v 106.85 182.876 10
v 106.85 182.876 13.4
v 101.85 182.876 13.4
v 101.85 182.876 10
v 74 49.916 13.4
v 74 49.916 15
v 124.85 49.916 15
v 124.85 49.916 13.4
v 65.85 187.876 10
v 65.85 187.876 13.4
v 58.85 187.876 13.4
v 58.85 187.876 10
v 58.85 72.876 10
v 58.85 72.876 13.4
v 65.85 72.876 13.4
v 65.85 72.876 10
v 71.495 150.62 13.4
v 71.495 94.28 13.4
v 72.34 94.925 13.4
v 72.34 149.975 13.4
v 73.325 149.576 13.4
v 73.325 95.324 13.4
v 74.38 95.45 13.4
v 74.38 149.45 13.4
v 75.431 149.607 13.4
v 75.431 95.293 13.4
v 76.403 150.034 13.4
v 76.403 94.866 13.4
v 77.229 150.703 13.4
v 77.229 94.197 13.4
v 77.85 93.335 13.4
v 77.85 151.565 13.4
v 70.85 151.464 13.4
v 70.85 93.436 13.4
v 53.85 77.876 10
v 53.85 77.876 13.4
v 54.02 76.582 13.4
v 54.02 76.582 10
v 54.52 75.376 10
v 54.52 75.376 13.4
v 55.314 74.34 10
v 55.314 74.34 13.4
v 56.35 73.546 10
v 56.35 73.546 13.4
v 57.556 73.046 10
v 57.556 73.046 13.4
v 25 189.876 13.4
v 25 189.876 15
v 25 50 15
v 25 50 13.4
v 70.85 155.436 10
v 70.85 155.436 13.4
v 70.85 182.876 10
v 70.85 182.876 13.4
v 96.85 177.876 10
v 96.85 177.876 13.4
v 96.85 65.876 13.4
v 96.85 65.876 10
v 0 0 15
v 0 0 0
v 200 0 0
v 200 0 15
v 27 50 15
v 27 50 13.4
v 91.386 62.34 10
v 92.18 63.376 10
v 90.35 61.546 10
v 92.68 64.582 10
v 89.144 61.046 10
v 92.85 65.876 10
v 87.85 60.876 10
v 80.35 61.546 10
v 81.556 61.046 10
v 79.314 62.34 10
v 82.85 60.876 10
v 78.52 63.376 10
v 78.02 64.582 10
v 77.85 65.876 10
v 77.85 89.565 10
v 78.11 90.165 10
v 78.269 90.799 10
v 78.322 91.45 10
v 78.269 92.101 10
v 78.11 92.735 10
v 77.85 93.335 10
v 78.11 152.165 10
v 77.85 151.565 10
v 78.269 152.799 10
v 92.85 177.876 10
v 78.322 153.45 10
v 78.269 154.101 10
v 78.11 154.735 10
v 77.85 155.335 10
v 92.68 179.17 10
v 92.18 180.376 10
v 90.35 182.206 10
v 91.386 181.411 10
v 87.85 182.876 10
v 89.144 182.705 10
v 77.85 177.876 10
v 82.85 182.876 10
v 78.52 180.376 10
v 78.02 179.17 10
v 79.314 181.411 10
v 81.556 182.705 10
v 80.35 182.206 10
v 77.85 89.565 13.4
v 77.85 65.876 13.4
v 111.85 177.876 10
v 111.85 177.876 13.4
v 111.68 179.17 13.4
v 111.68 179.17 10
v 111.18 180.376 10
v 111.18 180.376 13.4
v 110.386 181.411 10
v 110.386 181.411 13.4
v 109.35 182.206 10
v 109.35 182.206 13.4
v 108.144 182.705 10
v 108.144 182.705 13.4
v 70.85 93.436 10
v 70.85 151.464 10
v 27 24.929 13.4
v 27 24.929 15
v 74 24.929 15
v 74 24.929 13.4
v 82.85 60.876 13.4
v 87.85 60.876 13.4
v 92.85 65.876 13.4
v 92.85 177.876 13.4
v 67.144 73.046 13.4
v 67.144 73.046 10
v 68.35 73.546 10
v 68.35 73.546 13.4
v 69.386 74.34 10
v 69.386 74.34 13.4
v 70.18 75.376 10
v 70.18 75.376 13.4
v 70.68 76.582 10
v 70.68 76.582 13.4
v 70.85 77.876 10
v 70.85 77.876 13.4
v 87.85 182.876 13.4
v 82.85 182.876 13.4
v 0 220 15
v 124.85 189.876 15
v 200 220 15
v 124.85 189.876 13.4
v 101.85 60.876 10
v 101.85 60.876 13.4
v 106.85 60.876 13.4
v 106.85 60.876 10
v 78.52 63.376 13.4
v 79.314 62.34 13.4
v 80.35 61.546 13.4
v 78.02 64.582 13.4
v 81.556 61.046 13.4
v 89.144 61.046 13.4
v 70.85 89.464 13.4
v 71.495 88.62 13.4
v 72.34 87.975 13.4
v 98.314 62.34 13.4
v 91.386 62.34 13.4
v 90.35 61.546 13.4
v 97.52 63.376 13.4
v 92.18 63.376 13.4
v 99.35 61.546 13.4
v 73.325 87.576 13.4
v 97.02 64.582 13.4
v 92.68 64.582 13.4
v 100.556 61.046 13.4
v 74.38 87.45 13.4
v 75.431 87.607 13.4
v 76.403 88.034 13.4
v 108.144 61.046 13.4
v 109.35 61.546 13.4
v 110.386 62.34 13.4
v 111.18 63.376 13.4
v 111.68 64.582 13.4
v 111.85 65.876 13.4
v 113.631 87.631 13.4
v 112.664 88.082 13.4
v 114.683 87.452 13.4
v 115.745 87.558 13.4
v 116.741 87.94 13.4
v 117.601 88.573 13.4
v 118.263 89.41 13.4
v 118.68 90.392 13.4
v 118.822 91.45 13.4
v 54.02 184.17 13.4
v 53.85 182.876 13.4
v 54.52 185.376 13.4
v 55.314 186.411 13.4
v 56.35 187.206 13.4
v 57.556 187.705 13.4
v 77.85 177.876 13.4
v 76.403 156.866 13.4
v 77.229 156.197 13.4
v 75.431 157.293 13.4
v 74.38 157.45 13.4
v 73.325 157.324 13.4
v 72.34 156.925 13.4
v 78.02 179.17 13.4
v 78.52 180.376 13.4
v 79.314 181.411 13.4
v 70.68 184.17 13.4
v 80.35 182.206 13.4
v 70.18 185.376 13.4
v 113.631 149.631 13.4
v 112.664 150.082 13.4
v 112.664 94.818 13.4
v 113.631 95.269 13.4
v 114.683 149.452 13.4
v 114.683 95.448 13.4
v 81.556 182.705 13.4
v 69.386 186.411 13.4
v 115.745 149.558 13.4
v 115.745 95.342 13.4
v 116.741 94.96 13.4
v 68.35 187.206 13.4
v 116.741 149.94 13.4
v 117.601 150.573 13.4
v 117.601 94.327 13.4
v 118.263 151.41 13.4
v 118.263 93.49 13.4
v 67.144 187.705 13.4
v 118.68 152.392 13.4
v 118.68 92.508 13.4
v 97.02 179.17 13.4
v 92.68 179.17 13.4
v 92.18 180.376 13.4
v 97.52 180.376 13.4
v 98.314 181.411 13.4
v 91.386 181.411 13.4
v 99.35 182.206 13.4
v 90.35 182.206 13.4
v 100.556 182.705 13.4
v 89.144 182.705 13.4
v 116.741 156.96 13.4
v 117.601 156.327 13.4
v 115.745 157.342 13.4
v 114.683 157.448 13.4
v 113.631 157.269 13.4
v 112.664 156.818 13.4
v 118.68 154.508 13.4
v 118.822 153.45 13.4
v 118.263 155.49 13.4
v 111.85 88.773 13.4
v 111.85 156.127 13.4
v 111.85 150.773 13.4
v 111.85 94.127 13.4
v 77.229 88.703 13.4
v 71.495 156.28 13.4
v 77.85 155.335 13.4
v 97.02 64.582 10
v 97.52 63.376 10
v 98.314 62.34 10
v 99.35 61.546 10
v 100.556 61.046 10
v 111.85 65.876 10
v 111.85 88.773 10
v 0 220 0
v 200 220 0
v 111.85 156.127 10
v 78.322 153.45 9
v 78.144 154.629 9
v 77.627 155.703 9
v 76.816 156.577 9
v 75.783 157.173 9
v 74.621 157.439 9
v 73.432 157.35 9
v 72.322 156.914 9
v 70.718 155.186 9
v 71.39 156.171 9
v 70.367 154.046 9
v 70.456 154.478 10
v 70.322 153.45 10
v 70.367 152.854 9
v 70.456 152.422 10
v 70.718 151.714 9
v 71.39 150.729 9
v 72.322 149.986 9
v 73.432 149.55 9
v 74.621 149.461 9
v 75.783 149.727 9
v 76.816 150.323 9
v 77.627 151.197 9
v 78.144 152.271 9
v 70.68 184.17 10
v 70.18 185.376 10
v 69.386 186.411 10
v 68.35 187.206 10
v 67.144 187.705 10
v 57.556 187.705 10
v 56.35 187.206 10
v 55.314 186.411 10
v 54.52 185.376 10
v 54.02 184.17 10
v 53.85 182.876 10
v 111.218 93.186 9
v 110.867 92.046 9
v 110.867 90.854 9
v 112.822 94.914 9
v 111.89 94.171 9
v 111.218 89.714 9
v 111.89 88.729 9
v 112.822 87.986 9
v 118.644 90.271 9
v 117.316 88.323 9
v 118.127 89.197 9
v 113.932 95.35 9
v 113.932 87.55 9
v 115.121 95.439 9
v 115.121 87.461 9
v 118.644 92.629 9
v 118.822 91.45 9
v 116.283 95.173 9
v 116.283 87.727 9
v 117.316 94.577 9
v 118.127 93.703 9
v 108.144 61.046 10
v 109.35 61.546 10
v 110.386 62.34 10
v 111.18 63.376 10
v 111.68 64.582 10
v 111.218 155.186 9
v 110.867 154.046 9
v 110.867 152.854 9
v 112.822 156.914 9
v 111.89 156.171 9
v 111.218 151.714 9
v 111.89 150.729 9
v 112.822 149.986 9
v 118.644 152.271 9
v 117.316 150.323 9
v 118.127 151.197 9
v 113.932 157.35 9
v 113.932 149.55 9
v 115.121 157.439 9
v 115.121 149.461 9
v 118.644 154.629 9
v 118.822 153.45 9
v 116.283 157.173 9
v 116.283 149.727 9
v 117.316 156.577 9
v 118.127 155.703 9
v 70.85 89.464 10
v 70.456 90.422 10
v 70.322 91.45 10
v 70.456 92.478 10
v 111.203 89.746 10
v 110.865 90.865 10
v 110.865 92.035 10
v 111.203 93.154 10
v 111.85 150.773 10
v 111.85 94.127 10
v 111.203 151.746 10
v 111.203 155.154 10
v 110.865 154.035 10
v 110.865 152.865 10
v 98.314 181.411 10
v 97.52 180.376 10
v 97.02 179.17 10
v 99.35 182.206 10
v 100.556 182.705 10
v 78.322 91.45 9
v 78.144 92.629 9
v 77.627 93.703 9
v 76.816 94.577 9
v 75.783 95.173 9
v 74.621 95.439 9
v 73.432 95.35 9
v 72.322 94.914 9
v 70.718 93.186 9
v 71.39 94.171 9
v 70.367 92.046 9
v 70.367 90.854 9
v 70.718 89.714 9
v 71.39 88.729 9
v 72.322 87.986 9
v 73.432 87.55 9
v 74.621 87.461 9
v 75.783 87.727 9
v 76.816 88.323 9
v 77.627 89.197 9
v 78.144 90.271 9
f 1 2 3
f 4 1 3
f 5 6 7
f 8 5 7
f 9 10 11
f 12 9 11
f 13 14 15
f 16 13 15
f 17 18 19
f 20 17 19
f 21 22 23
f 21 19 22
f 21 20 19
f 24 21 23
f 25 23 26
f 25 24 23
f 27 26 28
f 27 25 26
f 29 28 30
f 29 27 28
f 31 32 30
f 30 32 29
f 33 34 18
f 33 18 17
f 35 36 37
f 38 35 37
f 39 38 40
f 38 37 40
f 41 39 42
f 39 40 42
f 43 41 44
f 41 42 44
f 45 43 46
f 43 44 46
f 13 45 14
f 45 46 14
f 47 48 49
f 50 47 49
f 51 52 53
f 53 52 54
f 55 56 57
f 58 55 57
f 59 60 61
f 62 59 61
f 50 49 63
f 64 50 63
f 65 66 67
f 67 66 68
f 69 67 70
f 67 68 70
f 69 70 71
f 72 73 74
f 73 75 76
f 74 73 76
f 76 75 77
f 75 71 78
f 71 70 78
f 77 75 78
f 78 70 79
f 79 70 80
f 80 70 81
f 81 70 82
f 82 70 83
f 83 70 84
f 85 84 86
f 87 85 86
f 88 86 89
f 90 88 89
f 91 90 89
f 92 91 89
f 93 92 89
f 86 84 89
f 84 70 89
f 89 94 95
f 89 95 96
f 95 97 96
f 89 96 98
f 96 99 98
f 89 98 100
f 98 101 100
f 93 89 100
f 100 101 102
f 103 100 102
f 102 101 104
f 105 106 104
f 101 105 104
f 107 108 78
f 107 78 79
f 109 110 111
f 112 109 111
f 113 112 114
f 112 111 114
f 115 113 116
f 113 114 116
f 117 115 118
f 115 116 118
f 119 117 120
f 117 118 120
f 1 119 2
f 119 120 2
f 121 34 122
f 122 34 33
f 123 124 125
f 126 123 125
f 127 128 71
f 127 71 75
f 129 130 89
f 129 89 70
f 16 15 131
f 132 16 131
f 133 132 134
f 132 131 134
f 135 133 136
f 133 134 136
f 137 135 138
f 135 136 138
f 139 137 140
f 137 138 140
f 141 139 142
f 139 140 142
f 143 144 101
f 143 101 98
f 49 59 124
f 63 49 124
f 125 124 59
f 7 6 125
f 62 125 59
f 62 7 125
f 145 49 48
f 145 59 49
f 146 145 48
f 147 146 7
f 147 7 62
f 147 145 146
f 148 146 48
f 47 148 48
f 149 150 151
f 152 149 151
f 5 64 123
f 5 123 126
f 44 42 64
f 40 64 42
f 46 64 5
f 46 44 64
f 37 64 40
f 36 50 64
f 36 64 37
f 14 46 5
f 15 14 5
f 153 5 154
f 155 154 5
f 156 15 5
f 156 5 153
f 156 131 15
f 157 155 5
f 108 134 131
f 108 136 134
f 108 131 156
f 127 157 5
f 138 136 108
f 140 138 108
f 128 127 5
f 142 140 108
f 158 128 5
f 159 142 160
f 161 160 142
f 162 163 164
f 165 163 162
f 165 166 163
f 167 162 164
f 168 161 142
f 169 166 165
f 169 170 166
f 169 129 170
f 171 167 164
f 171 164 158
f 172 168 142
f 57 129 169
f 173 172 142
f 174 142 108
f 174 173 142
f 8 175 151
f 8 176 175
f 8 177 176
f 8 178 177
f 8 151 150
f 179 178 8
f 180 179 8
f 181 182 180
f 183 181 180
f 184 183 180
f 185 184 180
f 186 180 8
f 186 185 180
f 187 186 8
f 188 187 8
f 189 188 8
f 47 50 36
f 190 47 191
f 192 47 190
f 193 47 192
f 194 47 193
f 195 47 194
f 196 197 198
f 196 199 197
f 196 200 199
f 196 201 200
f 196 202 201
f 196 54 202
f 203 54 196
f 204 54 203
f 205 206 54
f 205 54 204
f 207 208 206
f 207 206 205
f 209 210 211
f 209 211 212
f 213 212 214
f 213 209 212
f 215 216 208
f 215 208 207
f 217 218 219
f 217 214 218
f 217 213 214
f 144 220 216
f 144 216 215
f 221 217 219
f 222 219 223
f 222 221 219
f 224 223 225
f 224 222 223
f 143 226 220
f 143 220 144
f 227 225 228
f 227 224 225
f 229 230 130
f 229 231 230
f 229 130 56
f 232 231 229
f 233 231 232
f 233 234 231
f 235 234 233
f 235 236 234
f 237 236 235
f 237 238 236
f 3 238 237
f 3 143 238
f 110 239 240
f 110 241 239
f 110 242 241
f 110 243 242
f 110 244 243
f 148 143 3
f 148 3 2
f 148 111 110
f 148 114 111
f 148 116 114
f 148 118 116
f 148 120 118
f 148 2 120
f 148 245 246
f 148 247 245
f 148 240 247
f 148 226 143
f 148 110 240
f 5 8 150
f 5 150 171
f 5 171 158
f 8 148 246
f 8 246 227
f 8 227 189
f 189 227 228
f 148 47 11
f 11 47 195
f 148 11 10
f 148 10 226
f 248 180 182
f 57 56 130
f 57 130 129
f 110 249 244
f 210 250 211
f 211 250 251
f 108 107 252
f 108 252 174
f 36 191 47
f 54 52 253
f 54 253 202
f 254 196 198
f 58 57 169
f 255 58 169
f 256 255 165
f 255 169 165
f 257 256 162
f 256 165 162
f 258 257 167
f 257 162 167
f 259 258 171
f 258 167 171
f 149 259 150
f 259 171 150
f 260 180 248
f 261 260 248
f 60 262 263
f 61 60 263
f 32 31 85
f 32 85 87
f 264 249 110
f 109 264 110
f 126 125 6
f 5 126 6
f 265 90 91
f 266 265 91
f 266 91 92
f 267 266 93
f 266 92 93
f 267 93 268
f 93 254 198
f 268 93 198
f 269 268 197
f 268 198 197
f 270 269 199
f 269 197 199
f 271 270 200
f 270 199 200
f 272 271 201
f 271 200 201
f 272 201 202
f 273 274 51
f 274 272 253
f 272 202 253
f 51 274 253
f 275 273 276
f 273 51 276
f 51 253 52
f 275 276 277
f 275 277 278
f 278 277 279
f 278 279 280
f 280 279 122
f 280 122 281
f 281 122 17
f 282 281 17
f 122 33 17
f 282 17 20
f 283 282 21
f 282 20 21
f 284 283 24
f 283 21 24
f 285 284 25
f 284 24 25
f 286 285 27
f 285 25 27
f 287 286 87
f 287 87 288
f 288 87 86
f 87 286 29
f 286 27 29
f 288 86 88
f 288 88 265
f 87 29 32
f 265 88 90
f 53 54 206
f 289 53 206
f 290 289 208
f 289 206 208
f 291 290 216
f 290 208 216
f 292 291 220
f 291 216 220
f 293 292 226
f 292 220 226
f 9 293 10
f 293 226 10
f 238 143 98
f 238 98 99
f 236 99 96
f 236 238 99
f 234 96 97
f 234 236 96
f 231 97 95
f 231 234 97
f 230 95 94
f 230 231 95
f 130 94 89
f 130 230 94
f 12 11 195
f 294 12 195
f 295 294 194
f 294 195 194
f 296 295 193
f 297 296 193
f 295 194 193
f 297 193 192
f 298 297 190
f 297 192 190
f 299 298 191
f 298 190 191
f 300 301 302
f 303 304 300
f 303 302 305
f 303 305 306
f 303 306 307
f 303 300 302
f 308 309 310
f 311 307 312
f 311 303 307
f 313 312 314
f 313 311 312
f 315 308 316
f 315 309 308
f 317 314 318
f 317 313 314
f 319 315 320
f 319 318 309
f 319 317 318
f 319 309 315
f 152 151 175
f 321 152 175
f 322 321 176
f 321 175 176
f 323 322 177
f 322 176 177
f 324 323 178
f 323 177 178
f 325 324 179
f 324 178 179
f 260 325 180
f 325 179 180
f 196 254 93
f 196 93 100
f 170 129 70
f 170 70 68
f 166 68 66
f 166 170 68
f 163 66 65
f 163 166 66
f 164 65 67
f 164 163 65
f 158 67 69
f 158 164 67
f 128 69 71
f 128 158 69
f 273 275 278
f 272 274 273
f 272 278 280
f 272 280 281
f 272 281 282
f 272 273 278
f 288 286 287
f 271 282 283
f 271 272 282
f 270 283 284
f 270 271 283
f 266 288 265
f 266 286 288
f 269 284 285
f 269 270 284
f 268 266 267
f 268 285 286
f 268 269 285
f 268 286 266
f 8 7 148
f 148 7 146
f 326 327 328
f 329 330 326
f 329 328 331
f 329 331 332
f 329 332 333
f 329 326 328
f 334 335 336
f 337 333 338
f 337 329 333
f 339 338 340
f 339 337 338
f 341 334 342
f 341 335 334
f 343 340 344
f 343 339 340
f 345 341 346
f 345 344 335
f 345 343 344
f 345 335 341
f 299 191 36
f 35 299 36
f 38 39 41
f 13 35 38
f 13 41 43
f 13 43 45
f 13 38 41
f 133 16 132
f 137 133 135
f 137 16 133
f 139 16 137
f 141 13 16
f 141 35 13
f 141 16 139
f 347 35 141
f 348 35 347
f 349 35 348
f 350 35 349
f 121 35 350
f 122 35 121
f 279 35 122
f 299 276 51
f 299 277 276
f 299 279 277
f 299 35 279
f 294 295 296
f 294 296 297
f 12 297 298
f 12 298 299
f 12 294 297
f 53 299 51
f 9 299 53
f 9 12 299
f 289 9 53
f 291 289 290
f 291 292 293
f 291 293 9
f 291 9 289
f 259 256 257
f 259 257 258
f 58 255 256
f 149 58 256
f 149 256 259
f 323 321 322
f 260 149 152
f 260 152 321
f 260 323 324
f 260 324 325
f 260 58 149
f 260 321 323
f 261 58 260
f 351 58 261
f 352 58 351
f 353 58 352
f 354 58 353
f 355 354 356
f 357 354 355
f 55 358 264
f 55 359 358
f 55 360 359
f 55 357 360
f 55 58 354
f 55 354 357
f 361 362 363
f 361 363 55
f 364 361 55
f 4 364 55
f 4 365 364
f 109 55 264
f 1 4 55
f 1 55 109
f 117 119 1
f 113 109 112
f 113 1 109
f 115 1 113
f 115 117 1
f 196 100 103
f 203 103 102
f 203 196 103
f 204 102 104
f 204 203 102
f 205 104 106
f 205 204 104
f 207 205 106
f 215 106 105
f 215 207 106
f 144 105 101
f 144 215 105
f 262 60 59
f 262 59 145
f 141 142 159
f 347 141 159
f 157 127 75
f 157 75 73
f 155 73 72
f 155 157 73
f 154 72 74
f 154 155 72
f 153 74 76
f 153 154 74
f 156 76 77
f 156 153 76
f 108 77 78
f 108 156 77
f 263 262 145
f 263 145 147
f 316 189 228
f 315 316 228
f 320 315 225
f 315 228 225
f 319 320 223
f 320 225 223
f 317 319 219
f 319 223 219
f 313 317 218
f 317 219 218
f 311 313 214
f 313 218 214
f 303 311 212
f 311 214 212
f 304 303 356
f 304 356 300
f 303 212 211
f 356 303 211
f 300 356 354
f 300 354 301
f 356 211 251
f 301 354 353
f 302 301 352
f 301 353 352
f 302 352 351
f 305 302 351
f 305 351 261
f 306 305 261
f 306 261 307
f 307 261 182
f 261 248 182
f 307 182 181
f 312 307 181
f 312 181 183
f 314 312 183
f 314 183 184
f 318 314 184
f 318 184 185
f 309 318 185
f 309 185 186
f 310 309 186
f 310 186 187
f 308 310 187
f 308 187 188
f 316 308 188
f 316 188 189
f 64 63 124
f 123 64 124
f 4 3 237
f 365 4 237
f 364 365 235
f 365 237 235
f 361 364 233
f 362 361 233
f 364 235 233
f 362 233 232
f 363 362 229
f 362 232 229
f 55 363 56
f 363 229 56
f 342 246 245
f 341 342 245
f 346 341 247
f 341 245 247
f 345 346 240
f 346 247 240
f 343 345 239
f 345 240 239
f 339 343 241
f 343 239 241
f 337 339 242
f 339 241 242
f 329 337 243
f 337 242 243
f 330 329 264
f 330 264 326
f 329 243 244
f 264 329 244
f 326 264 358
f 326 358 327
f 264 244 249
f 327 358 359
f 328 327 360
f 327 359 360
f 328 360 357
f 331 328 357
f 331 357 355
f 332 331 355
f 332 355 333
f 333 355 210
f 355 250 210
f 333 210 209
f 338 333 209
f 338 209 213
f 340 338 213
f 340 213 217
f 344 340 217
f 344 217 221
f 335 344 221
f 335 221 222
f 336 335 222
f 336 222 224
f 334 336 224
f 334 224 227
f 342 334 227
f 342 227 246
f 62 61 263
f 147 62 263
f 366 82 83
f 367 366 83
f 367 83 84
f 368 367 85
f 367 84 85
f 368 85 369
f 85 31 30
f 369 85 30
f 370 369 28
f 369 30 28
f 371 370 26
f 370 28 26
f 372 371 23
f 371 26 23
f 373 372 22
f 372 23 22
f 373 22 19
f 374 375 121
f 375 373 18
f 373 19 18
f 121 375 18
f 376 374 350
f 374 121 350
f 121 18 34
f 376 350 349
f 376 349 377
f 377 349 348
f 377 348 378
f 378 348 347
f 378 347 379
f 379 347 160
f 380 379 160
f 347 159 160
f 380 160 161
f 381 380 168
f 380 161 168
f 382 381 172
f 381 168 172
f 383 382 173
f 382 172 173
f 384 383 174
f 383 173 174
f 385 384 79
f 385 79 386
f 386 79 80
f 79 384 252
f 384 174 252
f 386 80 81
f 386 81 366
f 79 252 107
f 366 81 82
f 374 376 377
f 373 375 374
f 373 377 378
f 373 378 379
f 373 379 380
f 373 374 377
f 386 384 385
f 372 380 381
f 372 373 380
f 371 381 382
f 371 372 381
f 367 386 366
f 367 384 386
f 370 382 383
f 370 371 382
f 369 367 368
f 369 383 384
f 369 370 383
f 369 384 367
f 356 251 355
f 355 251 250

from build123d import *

# Parameters (mm, degrees)
ESQUISSE1_W             = 200
ESQUISSE1_H             = 220
BOSS_EXTRU_1_DEPTH      = 15
ESQUISSE2_R             = 4
ENL_V_MAT_EXTRU_1_DEPTH = 6
ENL_V_MAT_EXTRU_2_DEPTH = 1.6
ENL_V_MAT_EXTRU_3_DEPTH = 5


with BuildPart() as part:
    # Esquisse1 → Boss.-Extru.1 (new body)
    with BuildSketch(Plane.XY):
        with Locations((100, 110)):
            Rectangle(ESQUISSE1_W, ESQUISSE1_H)
    extrude(amount=BOSS_EXTRU_1_DEPTH)

    # Esquisse2 → Enlèv. mat.-Extru.1 (cut)
    with BuildSketch(Plane.XY.offset(15)):
        with Locations((74.322, 91.45)):
            Circle(ESQUISSE2_R)
        with Locations((74.322, 153.45)):
            Circle(ESQUISSE2_R)
        with Locations((114.822, 91.45)):
            Circle(ESQUISSE2_R)
        with Locations((114.822, 153.45)):
            Circle(ESQUISSE2_R)
    extrude(amount=-ENL_V_MAT_EXTRU_1_DEPTH, mode=Mode.SUBTRACT)

    # Esquisse3 → Enlèv. mat.-Extru.2 (cut)
    with BuildSketch(Plane.XY.offset(15)):
        Polygon((27, 50), (27, 24.928776057), (74, 24.928776057), (74, 49.915697098), (124.85, 49.915697098), (124.85, 189.875697098), (25, 189.875697098), (25, 50), align=None)
    extrude(amount=-ENL_V_MAT_EXTRU_2_DEPTH, mode=Mode.SUBTRACT)

    # Esquisse4 → Enlèv. mat.-Extru.3 (cut)
    with BuildSketch(Plane.XY.offset(15)):
        with BuildLine():
            Line((106.85, 182.875697098), (101.85, 182.875697098))
            ThreePointArc((101.85, 182.875697098), (98.314466094, 181.411231003), (96.85, 177.875697098))
            Line((96.85, 177.875697098), (96.85, 65.875697098))
            ThreePointArc((96.85, 65.875697098), (98.314466094, 62.340163192), (101.85, 60.875697098))
            Line((101.85, 60.875697098), (106.85, 60.875697098))
            ThreePointArc((106.85, 60.875697098), (110.385533906, 62.340163192), (111.85, 65.875697098))
            Line((111.85, 65.875697098), (111.85, 177.875697098))
            ThreePointArc((111.85, 177.875697098), (110.385533906, 181.411231003), (106.85, 182.875697098))
        make_face()
        with BuildLine():
            Line((87.85, 60.875697098), (82.85, 60.875697098))
            ThreePointArc((82.85, 60.875697098), (79.314466094, 62.340163192), (77.85, 65.875697098))
            Line((77.85, 65.875697098), (77.85, 177.875697098))
            ThreePointArc((77.85, 177.875697098), (79.314466094, 181.411231003), (82.85, 182.875697098))
            Line((82.85, 182.875697098), (87.85, 182.875697098))
            ThreePointArc((87.85, 182.875697098), (91.385533906, 181.411231003), (92.85, 177.875697098))
            Line((92.85, 177.875697098), (92.85, 65.875697098))
            ThreePointArc((92.85, 65.875697098), (91.385533906, 62.340163192), (87.85, 60.875697098))
        make_face()
        with BuildLine():
            Line((65.85, 187.875697098), (58.85, 187.875697098))
            ThreePointArc((58.85, 187.875697098), (55.314466094, 186.411231003), (53.85, 182.875697098))
            Line((53.85, 182.875697098), (53.85, 77.875697098))
            ThreePointArc((53.85, 77.875697098), (55.314466094, 74.340163192), (58.85, 72.875697098))
            Line((58.85, 72.875697098), (65.85, 72.875697098))
            ThreePointArc((65.85, 72.875697098), (69.385533906, 74.340163192), (70.85, 77.875697098))
            Line((70.85, 77.875697098), (70.85, 182.875697098))
            ThreePointArc((70.85, 182.875697098), (69.385533906, 186.411231003), (65.85, 187.875697098))
        make_face()
    extrude(amount=-ENL_V_MAT_EXTRU_3_DEPTH, mode=Mode.SUBTRACT)


solid = part.part
